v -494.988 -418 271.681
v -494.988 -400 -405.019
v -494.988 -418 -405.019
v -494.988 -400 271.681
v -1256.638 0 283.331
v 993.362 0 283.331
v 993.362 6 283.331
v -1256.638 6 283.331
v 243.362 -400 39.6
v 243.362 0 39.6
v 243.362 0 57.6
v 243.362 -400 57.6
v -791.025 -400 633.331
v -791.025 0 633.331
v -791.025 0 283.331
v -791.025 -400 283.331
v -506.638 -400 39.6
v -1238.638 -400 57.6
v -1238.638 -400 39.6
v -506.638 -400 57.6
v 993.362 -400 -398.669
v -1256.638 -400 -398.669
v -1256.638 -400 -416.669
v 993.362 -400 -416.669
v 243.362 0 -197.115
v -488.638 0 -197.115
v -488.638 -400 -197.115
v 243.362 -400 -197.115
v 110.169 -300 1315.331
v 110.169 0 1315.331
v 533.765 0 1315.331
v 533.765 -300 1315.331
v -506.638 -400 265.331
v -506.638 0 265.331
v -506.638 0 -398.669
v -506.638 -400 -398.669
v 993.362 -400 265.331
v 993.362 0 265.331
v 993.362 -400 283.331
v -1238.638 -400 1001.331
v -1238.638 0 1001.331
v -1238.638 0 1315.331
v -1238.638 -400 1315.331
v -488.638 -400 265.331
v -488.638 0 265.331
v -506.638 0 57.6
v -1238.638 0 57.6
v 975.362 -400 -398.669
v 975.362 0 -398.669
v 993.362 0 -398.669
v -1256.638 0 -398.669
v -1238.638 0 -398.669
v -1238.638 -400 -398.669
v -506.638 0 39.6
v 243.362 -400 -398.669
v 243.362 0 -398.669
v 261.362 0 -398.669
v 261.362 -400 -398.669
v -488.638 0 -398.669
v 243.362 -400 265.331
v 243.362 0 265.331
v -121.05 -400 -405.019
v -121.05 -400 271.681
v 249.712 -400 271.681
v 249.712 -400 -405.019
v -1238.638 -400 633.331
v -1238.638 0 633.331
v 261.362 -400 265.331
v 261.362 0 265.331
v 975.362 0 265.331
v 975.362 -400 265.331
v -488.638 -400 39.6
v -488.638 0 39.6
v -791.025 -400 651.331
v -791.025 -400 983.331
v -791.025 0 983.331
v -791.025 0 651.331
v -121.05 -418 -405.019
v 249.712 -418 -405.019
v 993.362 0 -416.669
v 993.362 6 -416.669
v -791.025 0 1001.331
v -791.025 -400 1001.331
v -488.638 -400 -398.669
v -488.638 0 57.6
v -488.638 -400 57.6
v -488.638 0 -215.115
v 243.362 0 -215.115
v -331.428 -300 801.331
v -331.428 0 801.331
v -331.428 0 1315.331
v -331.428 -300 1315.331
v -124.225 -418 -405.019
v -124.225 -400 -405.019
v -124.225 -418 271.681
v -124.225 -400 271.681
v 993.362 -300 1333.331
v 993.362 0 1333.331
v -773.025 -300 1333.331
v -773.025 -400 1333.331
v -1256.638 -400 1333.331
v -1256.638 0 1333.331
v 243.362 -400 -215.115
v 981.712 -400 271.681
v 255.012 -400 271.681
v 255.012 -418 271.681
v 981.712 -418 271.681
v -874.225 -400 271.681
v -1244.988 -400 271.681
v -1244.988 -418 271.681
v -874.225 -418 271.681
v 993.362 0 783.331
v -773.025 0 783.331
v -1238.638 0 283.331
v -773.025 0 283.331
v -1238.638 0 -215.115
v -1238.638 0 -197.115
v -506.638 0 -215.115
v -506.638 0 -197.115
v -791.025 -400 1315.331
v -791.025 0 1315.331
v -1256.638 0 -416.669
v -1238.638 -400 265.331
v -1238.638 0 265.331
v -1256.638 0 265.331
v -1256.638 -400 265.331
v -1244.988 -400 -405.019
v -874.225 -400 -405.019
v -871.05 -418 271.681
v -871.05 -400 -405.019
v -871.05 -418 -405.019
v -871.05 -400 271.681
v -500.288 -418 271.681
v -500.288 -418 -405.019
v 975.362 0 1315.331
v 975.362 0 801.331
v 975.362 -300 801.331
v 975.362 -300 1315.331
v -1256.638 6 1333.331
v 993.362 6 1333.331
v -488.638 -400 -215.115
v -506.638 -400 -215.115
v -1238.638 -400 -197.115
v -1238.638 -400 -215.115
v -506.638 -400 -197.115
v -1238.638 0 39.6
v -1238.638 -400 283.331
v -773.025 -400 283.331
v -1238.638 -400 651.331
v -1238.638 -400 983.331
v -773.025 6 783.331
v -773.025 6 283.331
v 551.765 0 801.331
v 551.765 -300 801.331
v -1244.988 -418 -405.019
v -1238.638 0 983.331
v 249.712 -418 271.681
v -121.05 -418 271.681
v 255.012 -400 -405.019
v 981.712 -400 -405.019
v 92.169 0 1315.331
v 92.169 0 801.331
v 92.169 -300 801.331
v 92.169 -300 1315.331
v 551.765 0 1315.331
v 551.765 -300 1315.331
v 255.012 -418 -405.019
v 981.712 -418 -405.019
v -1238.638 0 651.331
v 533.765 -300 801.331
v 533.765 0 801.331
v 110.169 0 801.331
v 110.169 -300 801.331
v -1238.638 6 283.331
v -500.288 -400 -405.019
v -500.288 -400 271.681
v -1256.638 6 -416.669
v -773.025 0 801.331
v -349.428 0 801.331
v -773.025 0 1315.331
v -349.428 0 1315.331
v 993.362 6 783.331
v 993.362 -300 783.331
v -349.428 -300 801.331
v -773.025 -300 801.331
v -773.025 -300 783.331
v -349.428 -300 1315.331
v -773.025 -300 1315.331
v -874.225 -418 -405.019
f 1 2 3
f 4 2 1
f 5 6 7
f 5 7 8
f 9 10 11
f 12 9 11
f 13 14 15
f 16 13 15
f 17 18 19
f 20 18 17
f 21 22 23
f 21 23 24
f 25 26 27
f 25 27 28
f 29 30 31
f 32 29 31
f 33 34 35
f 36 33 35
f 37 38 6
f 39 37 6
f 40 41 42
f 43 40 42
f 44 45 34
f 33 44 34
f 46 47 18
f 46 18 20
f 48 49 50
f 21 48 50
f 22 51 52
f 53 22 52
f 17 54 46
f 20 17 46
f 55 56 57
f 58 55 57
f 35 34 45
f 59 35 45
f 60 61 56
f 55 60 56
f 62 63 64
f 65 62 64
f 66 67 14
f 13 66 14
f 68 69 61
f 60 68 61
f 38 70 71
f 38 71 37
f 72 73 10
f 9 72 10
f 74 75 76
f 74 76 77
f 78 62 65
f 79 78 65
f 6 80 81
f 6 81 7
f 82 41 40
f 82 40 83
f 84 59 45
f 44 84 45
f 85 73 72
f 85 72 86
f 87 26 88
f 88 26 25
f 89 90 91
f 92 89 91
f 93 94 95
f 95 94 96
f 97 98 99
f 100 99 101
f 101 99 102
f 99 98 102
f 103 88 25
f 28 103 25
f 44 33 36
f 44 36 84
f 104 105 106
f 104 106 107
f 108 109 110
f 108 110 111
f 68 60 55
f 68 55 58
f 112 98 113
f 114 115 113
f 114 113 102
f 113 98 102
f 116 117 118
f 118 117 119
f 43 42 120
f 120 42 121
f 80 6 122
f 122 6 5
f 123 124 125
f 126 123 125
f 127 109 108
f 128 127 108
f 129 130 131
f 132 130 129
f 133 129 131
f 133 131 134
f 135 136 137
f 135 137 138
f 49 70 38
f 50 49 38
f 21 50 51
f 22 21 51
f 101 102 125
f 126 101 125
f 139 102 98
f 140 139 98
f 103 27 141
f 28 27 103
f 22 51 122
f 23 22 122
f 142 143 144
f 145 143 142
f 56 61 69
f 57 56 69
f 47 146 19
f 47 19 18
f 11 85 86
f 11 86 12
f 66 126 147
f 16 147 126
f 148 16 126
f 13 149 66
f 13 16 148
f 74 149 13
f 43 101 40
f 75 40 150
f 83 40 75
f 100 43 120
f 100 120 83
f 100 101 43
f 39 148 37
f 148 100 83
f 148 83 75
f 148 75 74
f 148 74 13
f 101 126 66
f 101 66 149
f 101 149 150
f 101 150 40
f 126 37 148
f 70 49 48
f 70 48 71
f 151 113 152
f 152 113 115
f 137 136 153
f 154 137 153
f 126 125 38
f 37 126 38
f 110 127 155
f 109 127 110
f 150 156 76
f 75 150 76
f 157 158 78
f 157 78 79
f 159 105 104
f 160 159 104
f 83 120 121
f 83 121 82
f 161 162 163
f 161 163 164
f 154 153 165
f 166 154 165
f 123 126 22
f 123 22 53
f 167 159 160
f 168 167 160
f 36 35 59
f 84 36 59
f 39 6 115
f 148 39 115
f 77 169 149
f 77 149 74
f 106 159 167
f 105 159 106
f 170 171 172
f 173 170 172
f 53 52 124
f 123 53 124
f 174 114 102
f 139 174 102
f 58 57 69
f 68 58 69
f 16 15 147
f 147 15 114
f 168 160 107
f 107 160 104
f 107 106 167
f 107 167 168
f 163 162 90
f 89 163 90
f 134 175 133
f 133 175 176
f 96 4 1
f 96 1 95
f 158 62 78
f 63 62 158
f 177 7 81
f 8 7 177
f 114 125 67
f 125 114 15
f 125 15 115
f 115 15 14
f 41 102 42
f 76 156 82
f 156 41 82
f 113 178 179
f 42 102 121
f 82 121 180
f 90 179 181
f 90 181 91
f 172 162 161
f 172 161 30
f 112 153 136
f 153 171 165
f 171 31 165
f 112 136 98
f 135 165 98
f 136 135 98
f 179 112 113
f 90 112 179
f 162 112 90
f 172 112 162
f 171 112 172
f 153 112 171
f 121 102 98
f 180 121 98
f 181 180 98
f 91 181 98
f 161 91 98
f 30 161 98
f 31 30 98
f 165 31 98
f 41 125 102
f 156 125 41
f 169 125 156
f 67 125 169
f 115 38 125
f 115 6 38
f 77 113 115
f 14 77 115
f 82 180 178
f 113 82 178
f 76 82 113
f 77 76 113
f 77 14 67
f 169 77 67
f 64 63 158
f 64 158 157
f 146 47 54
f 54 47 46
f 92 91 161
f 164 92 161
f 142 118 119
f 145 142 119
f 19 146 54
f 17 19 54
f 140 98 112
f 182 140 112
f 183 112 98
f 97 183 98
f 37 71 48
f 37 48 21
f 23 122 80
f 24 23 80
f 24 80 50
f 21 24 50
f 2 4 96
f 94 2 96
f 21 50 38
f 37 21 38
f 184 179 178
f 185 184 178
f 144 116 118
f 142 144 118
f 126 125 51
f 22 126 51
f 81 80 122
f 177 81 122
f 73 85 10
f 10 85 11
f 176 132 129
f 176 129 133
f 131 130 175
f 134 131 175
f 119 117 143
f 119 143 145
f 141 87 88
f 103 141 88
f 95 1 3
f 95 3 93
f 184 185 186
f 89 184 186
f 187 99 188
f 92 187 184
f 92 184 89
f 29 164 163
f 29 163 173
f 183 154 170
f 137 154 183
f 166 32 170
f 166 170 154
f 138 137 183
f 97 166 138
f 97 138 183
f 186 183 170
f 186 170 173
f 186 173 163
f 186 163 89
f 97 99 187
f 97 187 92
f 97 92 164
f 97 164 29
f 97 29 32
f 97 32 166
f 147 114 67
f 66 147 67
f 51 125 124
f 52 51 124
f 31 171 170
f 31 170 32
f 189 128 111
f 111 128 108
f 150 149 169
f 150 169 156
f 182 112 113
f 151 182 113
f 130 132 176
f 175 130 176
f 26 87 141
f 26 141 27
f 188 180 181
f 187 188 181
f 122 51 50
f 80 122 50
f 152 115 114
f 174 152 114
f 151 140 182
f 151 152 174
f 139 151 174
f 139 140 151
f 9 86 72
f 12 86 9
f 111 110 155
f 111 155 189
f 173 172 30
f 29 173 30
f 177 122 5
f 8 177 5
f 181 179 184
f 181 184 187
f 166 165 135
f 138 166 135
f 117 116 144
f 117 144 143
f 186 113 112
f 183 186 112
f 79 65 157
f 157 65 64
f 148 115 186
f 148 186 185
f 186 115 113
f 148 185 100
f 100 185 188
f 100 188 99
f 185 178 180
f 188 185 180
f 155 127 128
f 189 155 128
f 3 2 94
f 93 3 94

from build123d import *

# Parameters (mm, degrees)
F1_DEPTH  = 400
F2_DEPTH  = 400
F3_DEPTH  = 400
F0_W      = 18
F0_H      = 664
F4_DEPTH  = 400
F5_DEPTH  = 400
F0_W_2    = 732
F0_H_2    = 18
F6_DEPTH  = 400
F7_DEPTH  = 400
F8_DEPTH  = 400
F9_DEPTH  = 400
F10_DEPTH = 400
F11_W     = 2250
F11_H     = 700
F12_DEPTH = 6
F13_W     = 370.7625
F13_H     = 676.7
F14_DEPTH = 18
F15_W     = 726.7
F15_H     = 676.7
F16_DEPTH = 18
F17_W     = 447.6132079363
F17_H     = 18
F18_DEPTH = 400
F17_W_2   = 18
F17_H_2   = 514
F19_DEPTH = 300
F21_DEPTH = 6


with BuildPart() as f1:
    # F0 (on Front) → F1 (new body)
    with BuildSketch(Plane.XZ):
        Polygon((993.3621138334, 283.330530931), (-1256.6378861666, 283.330530931), (-1256.6378861666, 265.330530931), (-1238.6378861666, 265.330530931), (-506.6378861666, 265.330530931), (-488.6378861666, 265.330530931), (243.3621138334, 265.330530931), (261.3621138334, 265.330530931), (975.3621138334, 265.330530931), (993.3621138334, 265.330530931), align=None)
    extrude(amount=F1_DEPTH)

    # F17 (on face) → F18 (join)
    with BuildSketch(Plane.XZ):
        Polygon((-1256.6378861666, 630.8754682541), (-1256.6378861666, 283.330530931), (-1238.6378861666, 283.330530931), (-1238.6378861666, 630.8754682541), (-1238.6378861666, 633.330530931), (-1238.6378861666, 651.330530931), (-1238.6378861666, 983.330530931), (-1238.6378861666, 1001.330530931), (-1238.6378861666, 1315.330530931), (-1238.6378861666, 1333.330530931), (-1256.6378861666, 1333.330530931), align=None)
        with Locations((-1014.8312821984, 1324.330530931)):
            Rectangle(F17_W, F17_H)
        Polygon((-791.0246782303, 301.330530931), (-791.0246782303, 283.330530931), (-773.0246782303, 283.330530931), (-773.0246782303, 301.330530931), (-773.0246782303, 783.330530931), (-773.0246782303, 801.330530931), (-773.0246782303, 1315.330530931), (-773.0246782303, 1333.330530931), (-791.0246782303, 1333.330530931), (-791.0246782303, 1315.330530931), (-791.0246782303, 1001.330530931), (-791.0246782303, 983.330530931), (-791.0246782303, 651.330530931), (-791.0246782303, 633.330530931), align=None)
        with Locations((-1014.8312821984, 992.330530931)):
            Rectangle(F17_W, F17_H)
        with Locations((-1014.8312821984, 642.330530931)):
            Rectangle(F17_W, F17_H)
    extrude(amount=F18_DEPTH)

    # F17 (on face) → F19 (join)
    with BuildSketch(Plane.XZ):
        Polygon((110.1687178016, 1333.330530931), (-773.0246782303, 1333.330530931), (-773.0246782303, 1315.330530931), (-349.4279802144, 1315.330530931), (-331.4279802144, 1315.330530931), (92.1687178016, 1315.330530931), (110.1687178016, 1315.330530931), (533.7654158175, 1315.330530931), (551.7654158175, 1315.330530931), (975.3621138334, 1315.330530931), (993.3621138334, 1315.330530931), (993.3621138334, 1333.330530931), align=None)
        Polygon((975.3621138334, 783.330530931), (993.3621138334, 783.330530931), (993.3621138334, 801.330530931), (975.3621138334, 801.330530931), (551.7654158175, 801.330530931), (533.7654158175, 801.330530931), (110.1687178016, 801.330530931), (92.1687178016, 801.330530931), (-331.4279802144, 801.330530931), (-349.4279802144, 801.330530931), (-773.0246782303, 801.330530931), (-773.0246782303, 783.330530931), (110.1687178016, 783.330530931), align=None)
        with Locations((-340.4279802144, 1058.330530931)):
            Rectangle(F17_W_2, F17_H_2)
        with Locations((101.1687178016, 1058.330530931)):
            Rectangle(F17_W_2, F17_H_2)
        with Locations((542.7654158175, 1058.330530931)):
            Rectangle(F17_W_2, F17_H_2)
        with Locations((984.3621138334, 1058.330530931)):
            Rectangle(F17_W_2, F17_H_2)
    extrude(amount=F19_DEPTH)


with BuildPart() as f2:
    # F0 (on Front) → F2 (new body)
    with BuildSketch(Plane.XZ):
        Polygon((-1238.6378861666, -398.669469069), (-1256.6378861666, -398.669469069), (-1256.6378861666, -416.669469069), (993.3621138334, -416.669469069), (993.3621138334, -398.669469069), (975.3621138334, -398.669469069), (261.3621138334, -398.669469069), (243.3621138334, -398.669469069), (-488.6378861666, -398.669469069), (-506.6378861666, -398.669469069), align=None)
    extrude(amount=F2_DEPTH)


with BuildPart() as f3:
    # F0 (on Front) → F3 (new body)
    with BuildSketch(Plane.XZ):
        Polygon((-1238.6378861666, 265.330530931), (-1256.6378861666, 265.330530931), (-1256.6378861666, -398.669469069), (-1238.6378861666, -398.669469069), (-1238.6378861666, -215.1148997545), (-1238.6378861666, -197.1148997545), (-1238.6378861666, 39.5995929539), (-1238.6378861666, 57.5995929539), align=None)
    extrude(amount=F3_DEPTH)


with BuildPart() as f4:
    # F0 (on Front) → F4 (new body)
    with BuildSketch(Plane.XZ):
        with Locations((984.3621138334, -66.669469069)):
            Rectangle(F0_W, F0_H)
    extrude(amount=F4_DEPTH)


with BuildPart() as f5:
    # F0 (on Front) → F5 (new body)
    with BuildSketch(Plane.XZ):
        Polygon((-488.6378861666, 265.330530931), (-506.6378861666, 265.330530931), (-506.6378861666, 57.5995929539), (-506.6378861666, 39.5995929539), (-506.6378861666, -197.1148997545), (-506.6378861666, -215.1148997545), (-506.6378861666, -398.669469069), (-488.6378861666, -398.669469069), (-488.6378861666, -215.1148997545), (-488.6378861666, -197.1148997545), (-488.6378861666, 39.5995929539), (-488.6378861666, 57.5995929539), align=None)
    extrude(amount=F5_DEPTH)


with BuildPart() as f6:
    # F0 (on Front) → F6 (new body)
    with BuildSketch(Plane.XZ):
        with Locations((-872.6378861666, -206.1148997545)):
            Rectangle(F0_W_2, F0_H_2)
    extrude(amount=F6_DEPTH)


with BuildPart() as f7:
    # F0 (on Front) → F7 (new body)
    with BuildSketch(Plane.XZ):
        with Locations((-872.6378861666, 48.5995929539)):
            Rectangle(F0_W_2, F0_H_2)
    extrude(amount=F7_DEPTH)


with BuildPart() as f8:
    # F0 (on Front) → F8 (new body)
    with BuildSketch(Plane.XZ):
        with Locations((-122.6378861666, 48.5995929539)):
            Rectangle(F0_W_2, F0_H_2)
    extrude(amount=F8_DEPTH)


with BuildPart() as f9:
    # F0 (on Front) → F9 (new body)
    with BuildSketch(Plane.XZ):
        with Locations((-122.6378861666, -206.1148997545)):
            Rectangle(F0_W_2, F0_H_2)
    extrude(amount=F9_DEPTH)


with BuildPart() as f10:
    # F0 (on Front) → F10 (new body)
    with BuildSketch(Plane.XZ):
        Polygon((261.3621138334, -398.669469069), (261.3621138334, 265.330530931), (243.3621138334, 265.330530931), (243.3621138334, 57.5995929539), (243.3621138334, 39.5995929539), (243.3621138334, -197.1148997545), (243.3621138334, -215.1148997545), (243.3621138334, -398.669469069), align=None)
    extrude(amount=F10_DEPTH)


with BuildPart() as f12:
    # F11 (on face) → F12 (new body)
    with BuildSketch(Plane(origin=(0, 0, 0), x_dir=(-1, 0, 0), z_dir=(0, 1, 0))):
        with Locations((131.6378861666, -66.669469069)):
            Rectangle(F11_W, F11_H)
    extrude(amount=F12_DEPTH)


with BuildPart() as f14:
    # F13 (on face) → F14 (new body)
    with BuildSketch(Plane.XZ.offset(400)):
        with Locations((-1059.6066361666, -66.669469069)):
            Rectangle(F13_W, F13_H)
    extrude(amount=F14_DEPTH)


with BuildPart() as f14b:
    # F13 (on face) → F14, piece 2 (new body)
    with BuildSketch(Plane.XZ.offset(400)):
        with Locations((-685.6691361666, -66.669469069)):
            Rectangle(F13_W, F13_H)
    extrude(amount=F14_DEPTH)


with BuildPart() as f14c:
    # F13 (on face) → F14, piece 3 (new body)
    with BuildSketch(Plane.XZ.offset(400)):
        with Locations((-309.6066361666, -66.669469069)):
            Rectangle(F13_W, F13_H)
    extrude(amount=F14_DEPTH)


with BuildPart() as f14d:
    # F13 (on face) → F14, piece 4 (new body)
    with BuildSketch(Plane.XZ.offset(400)):
        with Locations((64.3308638334, -66.669469069)):
            Rectangle(F13_W, F13_H)
    extrude(amount=F14_DEPTH)


with BuildPart() as f16:
    # F15 (on face) → F16 (new body)
    with BuildSketch(Plane.XZ.offset(400)):
        with Locations((618.3621138334, -66.669469069)):
            Rectangle(F15_W, F15_H)
    extrude(amount=F16_DEPTH)


with BuildPart() as f21:
    # F20 (on face) → F21 (new body)
    with BuildSketch(Plane(origin=(0, 0, 0), x_dir=(-1, 0, 0), z_dir=(0, 1, 0))):
        Polygon((1256.6378861666, 1333.330530931), (-993.3621138334, 1333.330530931), (-993.3621138334, 783.330530931), (773.0246782303, 783.330530931), (773.0246782303, 283.330530931), (1238.6378861666, 283.330530931), align=None)
    extrude(amount=F21_DEPTH)


solid = Compound([f1.part, f2.part, f3.part, f4.part, f5.part, f6.part, f7.part, f8.part, f9.part, f10.part, f12.part, f14.part, f14b.part, f14c.part, f14d.part, f16.part, f21.part])
